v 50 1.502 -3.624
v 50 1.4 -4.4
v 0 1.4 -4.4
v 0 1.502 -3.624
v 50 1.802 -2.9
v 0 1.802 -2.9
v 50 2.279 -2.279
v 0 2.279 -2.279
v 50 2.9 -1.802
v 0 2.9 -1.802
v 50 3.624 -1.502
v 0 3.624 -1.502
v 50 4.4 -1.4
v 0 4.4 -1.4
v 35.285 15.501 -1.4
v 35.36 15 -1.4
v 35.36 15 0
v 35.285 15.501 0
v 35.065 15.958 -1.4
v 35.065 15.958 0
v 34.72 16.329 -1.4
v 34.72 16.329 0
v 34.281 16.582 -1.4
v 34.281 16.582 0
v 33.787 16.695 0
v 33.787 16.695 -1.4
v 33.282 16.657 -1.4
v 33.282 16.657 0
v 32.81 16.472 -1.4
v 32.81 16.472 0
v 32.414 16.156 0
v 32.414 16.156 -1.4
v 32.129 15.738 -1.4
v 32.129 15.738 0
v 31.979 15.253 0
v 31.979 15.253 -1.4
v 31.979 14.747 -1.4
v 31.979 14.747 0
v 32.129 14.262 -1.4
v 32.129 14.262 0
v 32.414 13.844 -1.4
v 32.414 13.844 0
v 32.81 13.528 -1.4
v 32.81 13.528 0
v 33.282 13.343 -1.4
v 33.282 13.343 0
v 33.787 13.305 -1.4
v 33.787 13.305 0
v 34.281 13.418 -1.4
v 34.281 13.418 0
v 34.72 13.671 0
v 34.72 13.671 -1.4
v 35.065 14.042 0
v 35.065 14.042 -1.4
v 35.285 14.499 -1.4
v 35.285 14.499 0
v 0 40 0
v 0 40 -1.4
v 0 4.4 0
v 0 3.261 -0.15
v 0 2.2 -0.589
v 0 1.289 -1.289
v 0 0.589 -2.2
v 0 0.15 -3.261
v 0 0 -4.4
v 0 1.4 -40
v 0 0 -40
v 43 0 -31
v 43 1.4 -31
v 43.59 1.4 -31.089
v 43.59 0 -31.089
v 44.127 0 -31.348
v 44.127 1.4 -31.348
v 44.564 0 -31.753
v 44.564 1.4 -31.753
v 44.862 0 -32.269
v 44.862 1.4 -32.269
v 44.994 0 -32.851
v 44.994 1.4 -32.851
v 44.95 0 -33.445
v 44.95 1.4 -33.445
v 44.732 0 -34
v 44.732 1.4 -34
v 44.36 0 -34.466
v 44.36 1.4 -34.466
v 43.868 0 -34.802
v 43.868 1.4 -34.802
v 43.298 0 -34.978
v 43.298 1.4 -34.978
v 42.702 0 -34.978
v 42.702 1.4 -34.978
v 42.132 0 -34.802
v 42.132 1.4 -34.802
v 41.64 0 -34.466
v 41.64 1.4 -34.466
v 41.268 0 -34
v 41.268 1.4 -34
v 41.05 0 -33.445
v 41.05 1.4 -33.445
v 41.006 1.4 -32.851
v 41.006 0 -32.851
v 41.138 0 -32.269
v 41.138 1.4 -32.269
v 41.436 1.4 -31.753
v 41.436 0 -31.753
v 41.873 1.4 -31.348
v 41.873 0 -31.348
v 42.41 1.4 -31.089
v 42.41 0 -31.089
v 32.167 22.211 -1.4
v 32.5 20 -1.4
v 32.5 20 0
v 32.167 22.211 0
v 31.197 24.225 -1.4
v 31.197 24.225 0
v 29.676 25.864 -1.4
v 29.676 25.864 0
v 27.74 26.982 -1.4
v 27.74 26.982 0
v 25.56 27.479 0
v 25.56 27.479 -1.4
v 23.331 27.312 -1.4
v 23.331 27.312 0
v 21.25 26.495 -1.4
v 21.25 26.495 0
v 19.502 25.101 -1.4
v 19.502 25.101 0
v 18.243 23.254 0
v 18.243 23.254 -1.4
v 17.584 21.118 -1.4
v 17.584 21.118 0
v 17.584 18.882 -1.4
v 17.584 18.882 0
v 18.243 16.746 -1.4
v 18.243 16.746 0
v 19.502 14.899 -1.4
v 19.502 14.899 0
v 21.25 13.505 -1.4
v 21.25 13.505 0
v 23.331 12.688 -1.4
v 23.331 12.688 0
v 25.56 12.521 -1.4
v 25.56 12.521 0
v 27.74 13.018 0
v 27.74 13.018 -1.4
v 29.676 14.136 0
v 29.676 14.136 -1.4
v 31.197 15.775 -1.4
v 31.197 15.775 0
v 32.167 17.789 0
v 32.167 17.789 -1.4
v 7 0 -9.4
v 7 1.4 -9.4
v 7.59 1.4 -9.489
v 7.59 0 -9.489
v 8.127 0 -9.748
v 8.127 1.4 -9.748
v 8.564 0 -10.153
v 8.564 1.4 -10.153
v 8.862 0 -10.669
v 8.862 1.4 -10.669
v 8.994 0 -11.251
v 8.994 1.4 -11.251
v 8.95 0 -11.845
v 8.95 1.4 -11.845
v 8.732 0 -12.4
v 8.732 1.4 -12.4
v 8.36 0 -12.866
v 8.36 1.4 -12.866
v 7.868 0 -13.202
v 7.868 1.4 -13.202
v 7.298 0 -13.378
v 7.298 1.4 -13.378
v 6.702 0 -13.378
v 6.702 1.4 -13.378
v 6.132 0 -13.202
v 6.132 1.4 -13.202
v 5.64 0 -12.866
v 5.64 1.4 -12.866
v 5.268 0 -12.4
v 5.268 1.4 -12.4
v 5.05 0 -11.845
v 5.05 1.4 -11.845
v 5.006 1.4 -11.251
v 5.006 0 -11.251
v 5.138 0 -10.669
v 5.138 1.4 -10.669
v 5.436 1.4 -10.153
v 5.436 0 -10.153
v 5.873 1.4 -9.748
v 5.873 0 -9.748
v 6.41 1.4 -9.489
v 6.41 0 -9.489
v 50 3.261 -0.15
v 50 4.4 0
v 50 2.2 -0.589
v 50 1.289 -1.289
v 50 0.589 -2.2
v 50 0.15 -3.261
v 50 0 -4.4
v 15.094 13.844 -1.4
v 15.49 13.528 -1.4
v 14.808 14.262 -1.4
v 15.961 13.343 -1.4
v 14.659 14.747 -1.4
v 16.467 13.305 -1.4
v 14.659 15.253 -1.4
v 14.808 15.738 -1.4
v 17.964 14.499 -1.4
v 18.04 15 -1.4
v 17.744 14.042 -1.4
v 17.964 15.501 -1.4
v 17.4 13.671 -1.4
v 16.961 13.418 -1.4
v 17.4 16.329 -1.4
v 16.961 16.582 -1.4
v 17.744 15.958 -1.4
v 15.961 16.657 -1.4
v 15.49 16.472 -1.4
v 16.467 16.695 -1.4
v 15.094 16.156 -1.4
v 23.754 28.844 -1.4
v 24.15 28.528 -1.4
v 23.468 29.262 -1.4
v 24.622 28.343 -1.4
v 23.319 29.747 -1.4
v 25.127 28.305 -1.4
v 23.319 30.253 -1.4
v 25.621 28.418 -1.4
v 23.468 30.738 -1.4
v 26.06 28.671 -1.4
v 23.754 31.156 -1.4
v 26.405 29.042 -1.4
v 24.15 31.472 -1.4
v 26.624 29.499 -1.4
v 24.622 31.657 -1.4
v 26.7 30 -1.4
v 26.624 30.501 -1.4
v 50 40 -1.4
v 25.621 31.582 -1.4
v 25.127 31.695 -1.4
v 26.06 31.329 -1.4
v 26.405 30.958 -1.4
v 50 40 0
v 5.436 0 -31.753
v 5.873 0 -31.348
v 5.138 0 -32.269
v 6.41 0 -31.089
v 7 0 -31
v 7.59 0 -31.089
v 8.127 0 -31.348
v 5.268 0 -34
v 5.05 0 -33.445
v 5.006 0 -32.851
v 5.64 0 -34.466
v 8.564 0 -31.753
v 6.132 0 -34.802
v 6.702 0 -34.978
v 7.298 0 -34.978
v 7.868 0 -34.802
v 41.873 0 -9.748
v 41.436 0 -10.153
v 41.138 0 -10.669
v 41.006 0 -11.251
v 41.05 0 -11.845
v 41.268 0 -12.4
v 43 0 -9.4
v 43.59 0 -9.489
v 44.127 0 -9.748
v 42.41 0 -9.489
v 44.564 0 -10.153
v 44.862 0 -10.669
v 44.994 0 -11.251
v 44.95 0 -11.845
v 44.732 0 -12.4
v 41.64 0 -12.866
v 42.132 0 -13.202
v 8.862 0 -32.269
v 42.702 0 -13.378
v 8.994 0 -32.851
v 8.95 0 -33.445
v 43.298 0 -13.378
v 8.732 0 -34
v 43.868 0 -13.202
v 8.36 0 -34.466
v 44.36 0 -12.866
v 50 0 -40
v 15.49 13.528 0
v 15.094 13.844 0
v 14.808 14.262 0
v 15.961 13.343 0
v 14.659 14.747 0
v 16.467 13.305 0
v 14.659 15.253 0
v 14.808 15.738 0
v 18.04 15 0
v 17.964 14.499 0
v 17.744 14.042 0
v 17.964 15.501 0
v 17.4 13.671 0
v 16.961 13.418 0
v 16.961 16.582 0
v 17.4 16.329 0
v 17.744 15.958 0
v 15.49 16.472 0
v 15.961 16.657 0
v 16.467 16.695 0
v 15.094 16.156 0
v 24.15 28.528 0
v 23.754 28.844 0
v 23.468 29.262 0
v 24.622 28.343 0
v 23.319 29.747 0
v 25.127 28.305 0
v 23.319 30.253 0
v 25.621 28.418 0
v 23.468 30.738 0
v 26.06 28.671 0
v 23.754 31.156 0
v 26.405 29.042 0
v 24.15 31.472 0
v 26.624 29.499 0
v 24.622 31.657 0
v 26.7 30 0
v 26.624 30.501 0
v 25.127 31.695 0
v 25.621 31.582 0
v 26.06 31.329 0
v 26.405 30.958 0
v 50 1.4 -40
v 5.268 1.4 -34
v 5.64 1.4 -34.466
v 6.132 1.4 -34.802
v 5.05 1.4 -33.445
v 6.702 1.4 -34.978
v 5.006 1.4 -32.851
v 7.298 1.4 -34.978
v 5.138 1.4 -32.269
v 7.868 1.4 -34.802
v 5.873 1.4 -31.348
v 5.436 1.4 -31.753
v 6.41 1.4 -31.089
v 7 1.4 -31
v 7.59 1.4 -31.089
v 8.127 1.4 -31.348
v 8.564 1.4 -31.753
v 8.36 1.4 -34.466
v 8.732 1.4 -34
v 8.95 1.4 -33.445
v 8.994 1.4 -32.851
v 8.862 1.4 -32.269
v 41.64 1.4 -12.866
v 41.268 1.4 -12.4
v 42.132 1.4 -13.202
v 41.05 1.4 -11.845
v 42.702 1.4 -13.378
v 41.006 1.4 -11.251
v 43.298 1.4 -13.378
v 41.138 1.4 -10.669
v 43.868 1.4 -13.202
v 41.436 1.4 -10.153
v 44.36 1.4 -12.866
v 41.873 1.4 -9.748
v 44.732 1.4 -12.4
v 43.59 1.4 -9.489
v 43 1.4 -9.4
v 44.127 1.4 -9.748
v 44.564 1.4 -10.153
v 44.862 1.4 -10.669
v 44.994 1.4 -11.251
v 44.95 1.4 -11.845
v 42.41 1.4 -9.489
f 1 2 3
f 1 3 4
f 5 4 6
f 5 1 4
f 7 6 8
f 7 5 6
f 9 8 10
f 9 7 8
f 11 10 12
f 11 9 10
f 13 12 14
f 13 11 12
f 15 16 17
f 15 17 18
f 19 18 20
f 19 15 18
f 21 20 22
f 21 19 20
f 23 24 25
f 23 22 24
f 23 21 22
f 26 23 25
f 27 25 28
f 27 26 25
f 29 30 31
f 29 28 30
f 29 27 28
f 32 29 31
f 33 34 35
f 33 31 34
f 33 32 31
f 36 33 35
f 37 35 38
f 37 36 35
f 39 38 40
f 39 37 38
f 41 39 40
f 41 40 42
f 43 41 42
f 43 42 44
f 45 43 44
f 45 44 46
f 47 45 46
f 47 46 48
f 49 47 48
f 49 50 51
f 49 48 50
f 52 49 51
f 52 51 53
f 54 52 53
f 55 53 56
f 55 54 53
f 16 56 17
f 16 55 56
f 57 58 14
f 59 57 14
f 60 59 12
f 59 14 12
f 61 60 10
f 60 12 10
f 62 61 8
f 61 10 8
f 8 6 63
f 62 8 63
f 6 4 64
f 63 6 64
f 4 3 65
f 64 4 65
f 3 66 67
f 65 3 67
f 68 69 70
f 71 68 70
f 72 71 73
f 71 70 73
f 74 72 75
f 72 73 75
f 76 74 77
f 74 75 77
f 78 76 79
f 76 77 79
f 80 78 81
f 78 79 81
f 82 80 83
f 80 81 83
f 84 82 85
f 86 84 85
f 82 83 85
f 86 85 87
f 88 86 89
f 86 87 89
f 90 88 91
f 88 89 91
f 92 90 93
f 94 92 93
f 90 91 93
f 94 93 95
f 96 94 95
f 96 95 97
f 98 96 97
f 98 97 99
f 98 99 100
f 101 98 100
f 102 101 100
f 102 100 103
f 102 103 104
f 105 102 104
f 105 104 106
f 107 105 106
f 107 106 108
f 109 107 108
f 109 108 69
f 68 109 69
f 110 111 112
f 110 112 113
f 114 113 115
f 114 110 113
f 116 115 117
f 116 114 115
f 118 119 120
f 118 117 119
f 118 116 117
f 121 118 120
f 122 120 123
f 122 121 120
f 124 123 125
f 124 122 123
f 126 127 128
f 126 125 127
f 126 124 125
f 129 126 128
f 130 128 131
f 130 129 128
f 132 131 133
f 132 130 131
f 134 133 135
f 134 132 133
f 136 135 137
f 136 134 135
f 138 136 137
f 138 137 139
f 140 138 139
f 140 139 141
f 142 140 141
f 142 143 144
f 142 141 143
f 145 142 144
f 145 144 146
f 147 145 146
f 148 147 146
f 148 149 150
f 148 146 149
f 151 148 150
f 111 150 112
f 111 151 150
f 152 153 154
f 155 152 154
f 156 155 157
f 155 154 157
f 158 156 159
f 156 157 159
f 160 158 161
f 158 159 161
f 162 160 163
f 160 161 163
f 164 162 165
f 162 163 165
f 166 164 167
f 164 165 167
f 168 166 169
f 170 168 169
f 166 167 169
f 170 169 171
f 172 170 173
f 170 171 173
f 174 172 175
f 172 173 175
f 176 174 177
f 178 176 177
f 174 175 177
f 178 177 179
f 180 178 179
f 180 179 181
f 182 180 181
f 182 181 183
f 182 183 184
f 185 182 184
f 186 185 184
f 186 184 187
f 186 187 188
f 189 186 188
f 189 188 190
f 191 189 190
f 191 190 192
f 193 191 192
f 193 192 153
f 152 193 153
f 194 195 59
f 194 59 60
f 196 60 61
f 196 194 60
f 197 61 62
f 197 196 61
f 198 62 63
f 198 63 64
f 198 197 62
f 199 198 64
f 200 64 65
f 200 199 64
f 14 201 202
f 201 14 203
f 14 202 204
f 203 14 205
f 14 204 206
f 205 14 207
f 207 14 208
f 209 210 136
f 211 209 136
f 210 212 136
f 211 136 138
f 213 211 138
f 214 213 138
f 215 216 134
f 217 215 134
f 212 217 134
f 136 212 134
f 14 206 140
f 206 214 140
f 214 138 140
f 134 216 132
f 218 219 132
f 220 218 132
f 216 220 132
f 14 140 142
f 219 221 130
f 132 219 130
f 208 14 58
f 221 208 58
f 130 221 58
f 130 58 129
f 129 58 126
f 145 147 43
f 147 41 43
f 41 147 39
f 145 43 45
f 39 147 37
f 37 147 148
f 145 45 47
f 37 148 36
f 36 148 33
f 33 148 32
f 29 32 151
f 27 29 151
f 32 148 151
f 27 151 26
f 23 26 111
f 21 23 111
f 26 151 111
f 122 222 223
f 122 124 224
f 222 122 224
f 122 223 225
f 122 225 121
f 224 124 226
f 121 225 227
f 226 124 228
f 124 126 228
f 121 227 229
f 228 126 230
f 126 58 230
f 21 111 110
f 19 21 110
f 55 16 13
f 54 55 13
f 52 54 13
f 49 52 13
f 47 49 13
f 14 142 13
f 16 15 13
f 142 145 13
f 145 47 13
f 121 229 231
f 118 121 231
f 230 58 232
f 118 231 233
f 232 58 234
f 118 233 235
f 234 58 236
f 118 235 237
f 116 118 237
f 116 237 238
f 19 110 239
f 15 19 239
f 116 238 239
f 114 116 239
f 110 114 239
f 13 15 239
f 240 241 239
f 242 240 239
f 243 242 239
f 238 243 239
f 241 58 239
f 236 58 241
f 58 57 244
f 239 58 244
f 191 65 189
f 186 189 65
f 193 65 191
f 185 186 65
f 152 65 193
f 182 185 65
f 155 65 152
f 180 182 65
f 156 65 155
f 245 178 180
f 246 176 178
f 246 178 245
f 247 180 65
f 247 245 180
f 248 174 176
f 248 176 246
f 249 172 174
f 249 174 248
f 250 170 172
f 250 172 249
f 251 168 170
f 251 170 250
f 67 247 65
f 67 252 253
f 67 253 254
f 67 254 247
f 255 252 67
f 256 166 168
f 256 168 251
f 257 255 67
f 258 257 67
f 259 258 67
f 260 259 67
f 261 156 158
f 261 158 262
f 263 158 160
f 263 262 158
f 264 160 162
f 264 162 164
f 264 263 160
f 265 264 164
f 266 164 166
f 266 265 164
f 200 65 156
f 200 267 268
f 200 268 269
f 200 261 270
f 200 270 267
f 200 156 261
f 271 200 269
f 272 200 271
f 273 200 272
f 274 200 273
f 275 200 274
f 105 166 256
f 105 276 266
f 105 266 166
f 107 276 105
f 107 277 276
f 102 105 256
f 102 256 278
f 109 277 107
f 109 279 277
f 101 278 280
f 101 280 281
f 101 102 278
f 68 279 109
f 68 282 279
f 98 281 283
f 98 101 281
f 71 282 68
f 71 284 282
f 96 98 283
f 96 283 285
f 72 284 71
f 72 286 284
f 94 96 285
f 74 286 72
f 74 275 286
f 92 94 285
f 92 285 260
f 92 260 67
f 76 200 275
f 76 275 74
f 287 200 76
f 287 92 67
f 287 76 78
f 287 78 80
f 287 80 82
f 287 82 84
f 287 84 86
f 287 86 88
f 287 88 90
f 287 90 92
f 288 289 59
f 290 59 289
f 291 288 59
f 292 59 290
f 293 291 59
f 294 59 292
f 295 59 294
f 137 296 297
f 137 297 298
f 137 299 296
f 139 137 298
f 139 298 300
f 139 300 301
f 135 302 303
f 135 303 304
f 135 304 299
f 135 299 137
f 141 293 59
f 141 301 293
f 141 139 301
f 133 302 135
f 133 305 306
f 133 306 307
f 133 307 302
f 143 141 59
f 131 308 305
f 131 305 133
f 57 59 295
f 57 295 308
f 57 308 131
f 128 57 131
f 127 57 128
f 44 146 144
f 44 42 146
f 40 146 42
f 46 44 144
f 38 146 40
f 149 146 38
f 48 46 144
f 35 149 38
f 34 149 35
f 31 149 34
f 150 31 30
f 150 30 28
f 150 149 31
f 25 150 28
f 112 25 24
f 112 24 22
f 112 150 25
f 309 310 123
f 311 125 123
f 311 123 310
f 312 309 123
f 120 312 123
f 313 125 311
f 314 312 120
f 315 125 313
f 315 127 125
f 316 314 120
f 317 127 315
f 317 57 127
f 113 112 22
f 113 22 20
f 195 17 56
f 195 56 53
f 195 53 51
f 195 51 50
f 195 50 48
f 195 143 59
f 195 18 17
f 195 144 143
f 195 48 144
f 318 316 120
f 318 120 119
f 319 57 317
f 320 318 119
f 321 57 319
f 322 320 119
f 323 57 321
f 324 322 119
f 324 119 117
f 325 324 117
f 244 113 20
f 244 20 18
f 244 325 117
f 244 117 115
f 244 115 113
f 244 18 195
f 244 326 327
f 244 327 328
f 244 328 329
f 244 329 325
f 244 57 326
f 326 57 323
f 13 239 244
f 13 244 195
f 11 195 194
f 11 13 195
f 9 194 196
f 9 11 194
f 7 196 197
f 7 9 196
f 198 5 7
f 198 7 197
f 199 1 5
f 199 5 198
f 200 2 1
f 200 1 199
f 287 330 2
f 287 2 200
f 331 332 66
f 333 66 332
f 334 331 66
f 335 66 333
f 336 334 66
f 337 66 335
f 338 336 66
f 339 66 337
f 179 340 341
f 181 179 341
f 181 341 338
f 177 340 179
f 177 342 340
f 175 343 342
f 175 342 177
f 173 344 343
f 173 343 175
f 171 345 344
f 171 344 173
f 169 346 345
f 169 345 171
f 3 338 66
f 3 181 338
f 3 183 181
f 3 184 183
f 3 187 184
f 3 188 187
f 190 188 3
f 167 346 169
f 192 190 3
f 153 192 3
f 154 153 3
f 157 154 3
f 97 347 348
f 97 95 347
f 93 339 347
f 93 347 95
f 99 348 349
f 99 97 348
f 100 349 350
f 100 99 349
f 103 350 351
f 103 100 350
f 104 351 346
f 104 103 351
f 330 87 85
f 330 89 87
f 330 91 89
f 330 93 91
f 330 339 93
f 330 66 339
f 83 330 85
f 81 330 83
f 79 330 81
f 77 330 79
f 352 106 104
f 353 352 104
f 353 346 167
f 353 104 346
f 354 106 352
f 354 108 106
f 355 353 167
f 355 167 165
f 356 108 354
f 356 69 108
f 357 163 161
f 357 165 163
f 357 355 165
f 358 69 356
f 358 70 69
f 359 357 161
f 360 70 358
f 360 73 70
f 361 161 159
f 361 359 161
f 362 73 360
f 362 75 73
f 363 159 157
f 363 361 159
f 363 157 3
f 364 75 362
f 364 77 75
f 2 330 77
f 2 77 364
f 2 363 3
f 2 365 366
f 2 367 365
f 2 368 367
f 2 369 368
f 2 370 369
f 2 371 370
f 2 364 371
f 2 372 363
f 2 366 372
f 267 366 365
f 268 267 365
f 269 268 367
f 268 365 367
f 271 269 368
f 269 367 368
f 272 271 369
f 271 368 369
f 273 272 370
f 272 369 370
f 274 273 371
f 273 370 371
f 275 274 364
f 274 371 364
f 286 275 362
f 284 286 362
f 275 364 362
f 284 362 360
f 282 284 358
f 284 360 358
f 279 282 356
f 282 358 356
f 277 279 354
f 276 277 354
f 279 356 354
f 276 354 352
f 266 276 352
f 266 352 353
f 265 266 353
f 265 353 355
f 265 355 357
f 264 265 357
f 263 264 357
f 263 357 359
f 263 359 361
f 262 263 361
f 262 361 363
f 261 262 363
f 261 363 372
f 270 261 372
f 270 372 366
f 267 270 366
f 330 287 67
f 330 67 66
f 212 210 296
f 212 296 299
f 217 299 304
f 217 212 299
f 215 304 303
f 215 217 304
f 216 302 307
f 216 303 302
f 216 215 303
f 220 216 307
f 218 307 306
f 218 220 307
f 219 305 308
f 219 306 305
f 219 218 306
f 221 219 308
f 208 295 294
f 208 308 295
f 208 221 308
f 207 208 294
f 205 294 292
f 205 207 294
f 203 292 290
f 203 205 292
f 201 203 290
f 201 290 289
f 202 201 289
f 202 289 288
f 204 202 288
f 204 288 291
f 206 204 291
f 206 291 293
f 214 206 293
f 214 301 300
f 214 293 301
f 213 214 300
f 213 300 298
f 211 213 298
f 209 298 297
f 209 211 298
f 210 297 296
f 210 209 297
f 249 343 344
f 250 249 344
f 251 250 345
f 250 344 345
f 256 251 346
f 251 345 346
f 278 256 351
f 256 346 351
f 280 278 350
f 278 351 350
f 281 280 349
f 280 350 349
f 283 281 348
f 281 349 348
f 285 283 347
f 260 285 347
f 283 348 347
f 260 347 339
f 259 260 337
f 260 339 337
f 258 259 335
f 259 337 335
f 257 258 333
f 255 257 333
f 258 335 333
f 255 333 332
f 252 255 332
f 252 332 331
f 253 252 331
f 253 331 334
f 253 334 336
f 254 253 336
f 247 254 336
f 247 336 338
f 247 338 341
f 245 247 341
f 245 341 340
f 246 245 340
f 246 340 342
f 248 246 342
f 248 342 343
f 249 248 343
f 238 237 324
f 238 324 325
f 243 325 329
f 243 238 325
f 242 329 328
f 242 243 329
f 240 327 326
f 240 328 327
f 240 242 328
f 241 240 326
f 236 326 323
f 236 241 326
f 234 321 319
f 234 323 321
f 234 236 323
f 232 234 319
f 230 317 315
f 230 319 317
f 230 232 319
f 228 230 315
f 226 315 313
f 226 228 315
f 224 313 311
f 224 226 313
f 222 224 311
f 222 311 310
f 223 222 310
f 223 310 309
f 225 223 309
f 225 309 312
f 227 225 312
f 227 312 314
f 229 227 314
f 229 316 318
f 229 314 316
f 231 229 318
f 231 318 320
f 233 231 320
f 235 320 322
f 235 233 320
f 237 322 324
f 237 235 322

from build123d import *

# Parameters (mm, degrees)
SKETCH6_W                    = 50
SKETCH6_H                    = 40
BASE_FLANGE2_DEPTH           = 1.4
CUT_EXTRUDE2_DEPTH           = 65.046545574
CUT_EXTRUDE2_DEPTH_BACK      = 65.046545574
SKETCH11_R                   = 7.5
SKETCH11_R_2                 = 1.7
EDGE_FLANGE1_STRIP_W         = 11.6
EDGE_FLANGE1_STRIP_H         = 1.4
EDGE_FLANGE1_STRIP_CUT_DEPTH = 50
EDGE_FLANGE1_DEPTH           = 50
SKETCH35_R                   = 2
CUT_EXTRUDE3_DEPTH           = 75.766035069


# Sheet-metal steps are written as plain solids
with BuildPart() as part:
    # Sketch6 → Base-Flange2 (new body)
    with BuildSketch(Plane.XY):
        with Locations((25, 20)):
            Rectangle(SKETCH6_W, SKETCH6_H)
    extrude(amount=-BASE_FLANGE2_DEPTH)

    # Sketch11 → Cut-Extrude2 (cut, two sides: drawn at the far end of the back side and taken through both)
    with BuildSketch(Plane.XY.offset(-1.4).offset(-CUT_EXTRUDE2_DEPTH_BACK)):
        with Locations((25, 20)):
            Circle(SKETCH11_R)
        with Locations((25, 30)):
            Circle(SKETCH11_R_2)
        with Locations((16.339745962, 15)):
            Circle(SKETCH11_R_2)
        with Locations((33.660254038, 15)):
            Circle(SKETCH11_R_2)
    extrude(amount=CUT_EXTRUDE2_DEPTH + CUT_EXTRUDE2_DEPTH_BACK, mode=Mode.SUBTRACT)

    # Edge-Flange1 strip (across the edge) → Edge-Flange1 strip cut (cut)
    with BuildSketch(Plane(origin=(50, 0, -1.4), x_dir=(0, 1, 0), z_dir=(-1, 0, 0))):
        with Locations((-1.4, -0.7)):
            Rectangle(EDGE_FLANGE1_STRIP_W, EDGE_FLANGE1_STRIP_H)
    extrude(amount=EDGE_FLANGE1_STRIP_CUT_DEPTH, mode=Mode.SUBTRACT)

    # Edge-Flange1 section (across the edge) → Edge-Flange1 (add)
    with BuildSketch(Plane(origin=(50, 0, -1.4), x_dir=(0, 1, 0), z_dir=(-1, 0, 0))):
        with BuildLine():
            Line((0, 3), (0, 38.6))
            Line((0, 38.6), (1.4, 38.6))
            Line((1.4, 38.6), (1.4, 3))
            ThreePointArc((1.4, 3), (2.278679656, 0.878679656), (4.4, 0))
            Line((4.4, 0), (4.4, -1.4))
            ThreePointArc((4.4, -1.4), (1.288730163, -0.111269837), (0, 3))
        make_face()
    extrude(amount=EDGE_FLANGE1_DEPTH)

    # Sketch35 → Cut-Extrude3 (cut, through all)
    with BuildSketch(Plane(origin=(0, 1.4, 0), x_dir=(1, 0, 0), z_dir=(0, 1, 0))):
        with Locations(Location((43, 11.4, 0), (0, 0, 270))):
            Circle(SKETCH35_R)
        with Locations(Location((7, 11.4, 0), (0, 0, 270))):
            Circle(SKETCH35_R)
        with Locations(Location((43, 33, 0), (0, 0, 270))):
            Circle(SKETCH35_R)
        with Locations(Location((7, 33, 0), (0, 0, 270))):
            Circle(SKETCH35_R)
    extrude(amount=-CUT_EXTRUDE3_DEPTH, mode=Mode.SUBTRACT)


solid = part.part
